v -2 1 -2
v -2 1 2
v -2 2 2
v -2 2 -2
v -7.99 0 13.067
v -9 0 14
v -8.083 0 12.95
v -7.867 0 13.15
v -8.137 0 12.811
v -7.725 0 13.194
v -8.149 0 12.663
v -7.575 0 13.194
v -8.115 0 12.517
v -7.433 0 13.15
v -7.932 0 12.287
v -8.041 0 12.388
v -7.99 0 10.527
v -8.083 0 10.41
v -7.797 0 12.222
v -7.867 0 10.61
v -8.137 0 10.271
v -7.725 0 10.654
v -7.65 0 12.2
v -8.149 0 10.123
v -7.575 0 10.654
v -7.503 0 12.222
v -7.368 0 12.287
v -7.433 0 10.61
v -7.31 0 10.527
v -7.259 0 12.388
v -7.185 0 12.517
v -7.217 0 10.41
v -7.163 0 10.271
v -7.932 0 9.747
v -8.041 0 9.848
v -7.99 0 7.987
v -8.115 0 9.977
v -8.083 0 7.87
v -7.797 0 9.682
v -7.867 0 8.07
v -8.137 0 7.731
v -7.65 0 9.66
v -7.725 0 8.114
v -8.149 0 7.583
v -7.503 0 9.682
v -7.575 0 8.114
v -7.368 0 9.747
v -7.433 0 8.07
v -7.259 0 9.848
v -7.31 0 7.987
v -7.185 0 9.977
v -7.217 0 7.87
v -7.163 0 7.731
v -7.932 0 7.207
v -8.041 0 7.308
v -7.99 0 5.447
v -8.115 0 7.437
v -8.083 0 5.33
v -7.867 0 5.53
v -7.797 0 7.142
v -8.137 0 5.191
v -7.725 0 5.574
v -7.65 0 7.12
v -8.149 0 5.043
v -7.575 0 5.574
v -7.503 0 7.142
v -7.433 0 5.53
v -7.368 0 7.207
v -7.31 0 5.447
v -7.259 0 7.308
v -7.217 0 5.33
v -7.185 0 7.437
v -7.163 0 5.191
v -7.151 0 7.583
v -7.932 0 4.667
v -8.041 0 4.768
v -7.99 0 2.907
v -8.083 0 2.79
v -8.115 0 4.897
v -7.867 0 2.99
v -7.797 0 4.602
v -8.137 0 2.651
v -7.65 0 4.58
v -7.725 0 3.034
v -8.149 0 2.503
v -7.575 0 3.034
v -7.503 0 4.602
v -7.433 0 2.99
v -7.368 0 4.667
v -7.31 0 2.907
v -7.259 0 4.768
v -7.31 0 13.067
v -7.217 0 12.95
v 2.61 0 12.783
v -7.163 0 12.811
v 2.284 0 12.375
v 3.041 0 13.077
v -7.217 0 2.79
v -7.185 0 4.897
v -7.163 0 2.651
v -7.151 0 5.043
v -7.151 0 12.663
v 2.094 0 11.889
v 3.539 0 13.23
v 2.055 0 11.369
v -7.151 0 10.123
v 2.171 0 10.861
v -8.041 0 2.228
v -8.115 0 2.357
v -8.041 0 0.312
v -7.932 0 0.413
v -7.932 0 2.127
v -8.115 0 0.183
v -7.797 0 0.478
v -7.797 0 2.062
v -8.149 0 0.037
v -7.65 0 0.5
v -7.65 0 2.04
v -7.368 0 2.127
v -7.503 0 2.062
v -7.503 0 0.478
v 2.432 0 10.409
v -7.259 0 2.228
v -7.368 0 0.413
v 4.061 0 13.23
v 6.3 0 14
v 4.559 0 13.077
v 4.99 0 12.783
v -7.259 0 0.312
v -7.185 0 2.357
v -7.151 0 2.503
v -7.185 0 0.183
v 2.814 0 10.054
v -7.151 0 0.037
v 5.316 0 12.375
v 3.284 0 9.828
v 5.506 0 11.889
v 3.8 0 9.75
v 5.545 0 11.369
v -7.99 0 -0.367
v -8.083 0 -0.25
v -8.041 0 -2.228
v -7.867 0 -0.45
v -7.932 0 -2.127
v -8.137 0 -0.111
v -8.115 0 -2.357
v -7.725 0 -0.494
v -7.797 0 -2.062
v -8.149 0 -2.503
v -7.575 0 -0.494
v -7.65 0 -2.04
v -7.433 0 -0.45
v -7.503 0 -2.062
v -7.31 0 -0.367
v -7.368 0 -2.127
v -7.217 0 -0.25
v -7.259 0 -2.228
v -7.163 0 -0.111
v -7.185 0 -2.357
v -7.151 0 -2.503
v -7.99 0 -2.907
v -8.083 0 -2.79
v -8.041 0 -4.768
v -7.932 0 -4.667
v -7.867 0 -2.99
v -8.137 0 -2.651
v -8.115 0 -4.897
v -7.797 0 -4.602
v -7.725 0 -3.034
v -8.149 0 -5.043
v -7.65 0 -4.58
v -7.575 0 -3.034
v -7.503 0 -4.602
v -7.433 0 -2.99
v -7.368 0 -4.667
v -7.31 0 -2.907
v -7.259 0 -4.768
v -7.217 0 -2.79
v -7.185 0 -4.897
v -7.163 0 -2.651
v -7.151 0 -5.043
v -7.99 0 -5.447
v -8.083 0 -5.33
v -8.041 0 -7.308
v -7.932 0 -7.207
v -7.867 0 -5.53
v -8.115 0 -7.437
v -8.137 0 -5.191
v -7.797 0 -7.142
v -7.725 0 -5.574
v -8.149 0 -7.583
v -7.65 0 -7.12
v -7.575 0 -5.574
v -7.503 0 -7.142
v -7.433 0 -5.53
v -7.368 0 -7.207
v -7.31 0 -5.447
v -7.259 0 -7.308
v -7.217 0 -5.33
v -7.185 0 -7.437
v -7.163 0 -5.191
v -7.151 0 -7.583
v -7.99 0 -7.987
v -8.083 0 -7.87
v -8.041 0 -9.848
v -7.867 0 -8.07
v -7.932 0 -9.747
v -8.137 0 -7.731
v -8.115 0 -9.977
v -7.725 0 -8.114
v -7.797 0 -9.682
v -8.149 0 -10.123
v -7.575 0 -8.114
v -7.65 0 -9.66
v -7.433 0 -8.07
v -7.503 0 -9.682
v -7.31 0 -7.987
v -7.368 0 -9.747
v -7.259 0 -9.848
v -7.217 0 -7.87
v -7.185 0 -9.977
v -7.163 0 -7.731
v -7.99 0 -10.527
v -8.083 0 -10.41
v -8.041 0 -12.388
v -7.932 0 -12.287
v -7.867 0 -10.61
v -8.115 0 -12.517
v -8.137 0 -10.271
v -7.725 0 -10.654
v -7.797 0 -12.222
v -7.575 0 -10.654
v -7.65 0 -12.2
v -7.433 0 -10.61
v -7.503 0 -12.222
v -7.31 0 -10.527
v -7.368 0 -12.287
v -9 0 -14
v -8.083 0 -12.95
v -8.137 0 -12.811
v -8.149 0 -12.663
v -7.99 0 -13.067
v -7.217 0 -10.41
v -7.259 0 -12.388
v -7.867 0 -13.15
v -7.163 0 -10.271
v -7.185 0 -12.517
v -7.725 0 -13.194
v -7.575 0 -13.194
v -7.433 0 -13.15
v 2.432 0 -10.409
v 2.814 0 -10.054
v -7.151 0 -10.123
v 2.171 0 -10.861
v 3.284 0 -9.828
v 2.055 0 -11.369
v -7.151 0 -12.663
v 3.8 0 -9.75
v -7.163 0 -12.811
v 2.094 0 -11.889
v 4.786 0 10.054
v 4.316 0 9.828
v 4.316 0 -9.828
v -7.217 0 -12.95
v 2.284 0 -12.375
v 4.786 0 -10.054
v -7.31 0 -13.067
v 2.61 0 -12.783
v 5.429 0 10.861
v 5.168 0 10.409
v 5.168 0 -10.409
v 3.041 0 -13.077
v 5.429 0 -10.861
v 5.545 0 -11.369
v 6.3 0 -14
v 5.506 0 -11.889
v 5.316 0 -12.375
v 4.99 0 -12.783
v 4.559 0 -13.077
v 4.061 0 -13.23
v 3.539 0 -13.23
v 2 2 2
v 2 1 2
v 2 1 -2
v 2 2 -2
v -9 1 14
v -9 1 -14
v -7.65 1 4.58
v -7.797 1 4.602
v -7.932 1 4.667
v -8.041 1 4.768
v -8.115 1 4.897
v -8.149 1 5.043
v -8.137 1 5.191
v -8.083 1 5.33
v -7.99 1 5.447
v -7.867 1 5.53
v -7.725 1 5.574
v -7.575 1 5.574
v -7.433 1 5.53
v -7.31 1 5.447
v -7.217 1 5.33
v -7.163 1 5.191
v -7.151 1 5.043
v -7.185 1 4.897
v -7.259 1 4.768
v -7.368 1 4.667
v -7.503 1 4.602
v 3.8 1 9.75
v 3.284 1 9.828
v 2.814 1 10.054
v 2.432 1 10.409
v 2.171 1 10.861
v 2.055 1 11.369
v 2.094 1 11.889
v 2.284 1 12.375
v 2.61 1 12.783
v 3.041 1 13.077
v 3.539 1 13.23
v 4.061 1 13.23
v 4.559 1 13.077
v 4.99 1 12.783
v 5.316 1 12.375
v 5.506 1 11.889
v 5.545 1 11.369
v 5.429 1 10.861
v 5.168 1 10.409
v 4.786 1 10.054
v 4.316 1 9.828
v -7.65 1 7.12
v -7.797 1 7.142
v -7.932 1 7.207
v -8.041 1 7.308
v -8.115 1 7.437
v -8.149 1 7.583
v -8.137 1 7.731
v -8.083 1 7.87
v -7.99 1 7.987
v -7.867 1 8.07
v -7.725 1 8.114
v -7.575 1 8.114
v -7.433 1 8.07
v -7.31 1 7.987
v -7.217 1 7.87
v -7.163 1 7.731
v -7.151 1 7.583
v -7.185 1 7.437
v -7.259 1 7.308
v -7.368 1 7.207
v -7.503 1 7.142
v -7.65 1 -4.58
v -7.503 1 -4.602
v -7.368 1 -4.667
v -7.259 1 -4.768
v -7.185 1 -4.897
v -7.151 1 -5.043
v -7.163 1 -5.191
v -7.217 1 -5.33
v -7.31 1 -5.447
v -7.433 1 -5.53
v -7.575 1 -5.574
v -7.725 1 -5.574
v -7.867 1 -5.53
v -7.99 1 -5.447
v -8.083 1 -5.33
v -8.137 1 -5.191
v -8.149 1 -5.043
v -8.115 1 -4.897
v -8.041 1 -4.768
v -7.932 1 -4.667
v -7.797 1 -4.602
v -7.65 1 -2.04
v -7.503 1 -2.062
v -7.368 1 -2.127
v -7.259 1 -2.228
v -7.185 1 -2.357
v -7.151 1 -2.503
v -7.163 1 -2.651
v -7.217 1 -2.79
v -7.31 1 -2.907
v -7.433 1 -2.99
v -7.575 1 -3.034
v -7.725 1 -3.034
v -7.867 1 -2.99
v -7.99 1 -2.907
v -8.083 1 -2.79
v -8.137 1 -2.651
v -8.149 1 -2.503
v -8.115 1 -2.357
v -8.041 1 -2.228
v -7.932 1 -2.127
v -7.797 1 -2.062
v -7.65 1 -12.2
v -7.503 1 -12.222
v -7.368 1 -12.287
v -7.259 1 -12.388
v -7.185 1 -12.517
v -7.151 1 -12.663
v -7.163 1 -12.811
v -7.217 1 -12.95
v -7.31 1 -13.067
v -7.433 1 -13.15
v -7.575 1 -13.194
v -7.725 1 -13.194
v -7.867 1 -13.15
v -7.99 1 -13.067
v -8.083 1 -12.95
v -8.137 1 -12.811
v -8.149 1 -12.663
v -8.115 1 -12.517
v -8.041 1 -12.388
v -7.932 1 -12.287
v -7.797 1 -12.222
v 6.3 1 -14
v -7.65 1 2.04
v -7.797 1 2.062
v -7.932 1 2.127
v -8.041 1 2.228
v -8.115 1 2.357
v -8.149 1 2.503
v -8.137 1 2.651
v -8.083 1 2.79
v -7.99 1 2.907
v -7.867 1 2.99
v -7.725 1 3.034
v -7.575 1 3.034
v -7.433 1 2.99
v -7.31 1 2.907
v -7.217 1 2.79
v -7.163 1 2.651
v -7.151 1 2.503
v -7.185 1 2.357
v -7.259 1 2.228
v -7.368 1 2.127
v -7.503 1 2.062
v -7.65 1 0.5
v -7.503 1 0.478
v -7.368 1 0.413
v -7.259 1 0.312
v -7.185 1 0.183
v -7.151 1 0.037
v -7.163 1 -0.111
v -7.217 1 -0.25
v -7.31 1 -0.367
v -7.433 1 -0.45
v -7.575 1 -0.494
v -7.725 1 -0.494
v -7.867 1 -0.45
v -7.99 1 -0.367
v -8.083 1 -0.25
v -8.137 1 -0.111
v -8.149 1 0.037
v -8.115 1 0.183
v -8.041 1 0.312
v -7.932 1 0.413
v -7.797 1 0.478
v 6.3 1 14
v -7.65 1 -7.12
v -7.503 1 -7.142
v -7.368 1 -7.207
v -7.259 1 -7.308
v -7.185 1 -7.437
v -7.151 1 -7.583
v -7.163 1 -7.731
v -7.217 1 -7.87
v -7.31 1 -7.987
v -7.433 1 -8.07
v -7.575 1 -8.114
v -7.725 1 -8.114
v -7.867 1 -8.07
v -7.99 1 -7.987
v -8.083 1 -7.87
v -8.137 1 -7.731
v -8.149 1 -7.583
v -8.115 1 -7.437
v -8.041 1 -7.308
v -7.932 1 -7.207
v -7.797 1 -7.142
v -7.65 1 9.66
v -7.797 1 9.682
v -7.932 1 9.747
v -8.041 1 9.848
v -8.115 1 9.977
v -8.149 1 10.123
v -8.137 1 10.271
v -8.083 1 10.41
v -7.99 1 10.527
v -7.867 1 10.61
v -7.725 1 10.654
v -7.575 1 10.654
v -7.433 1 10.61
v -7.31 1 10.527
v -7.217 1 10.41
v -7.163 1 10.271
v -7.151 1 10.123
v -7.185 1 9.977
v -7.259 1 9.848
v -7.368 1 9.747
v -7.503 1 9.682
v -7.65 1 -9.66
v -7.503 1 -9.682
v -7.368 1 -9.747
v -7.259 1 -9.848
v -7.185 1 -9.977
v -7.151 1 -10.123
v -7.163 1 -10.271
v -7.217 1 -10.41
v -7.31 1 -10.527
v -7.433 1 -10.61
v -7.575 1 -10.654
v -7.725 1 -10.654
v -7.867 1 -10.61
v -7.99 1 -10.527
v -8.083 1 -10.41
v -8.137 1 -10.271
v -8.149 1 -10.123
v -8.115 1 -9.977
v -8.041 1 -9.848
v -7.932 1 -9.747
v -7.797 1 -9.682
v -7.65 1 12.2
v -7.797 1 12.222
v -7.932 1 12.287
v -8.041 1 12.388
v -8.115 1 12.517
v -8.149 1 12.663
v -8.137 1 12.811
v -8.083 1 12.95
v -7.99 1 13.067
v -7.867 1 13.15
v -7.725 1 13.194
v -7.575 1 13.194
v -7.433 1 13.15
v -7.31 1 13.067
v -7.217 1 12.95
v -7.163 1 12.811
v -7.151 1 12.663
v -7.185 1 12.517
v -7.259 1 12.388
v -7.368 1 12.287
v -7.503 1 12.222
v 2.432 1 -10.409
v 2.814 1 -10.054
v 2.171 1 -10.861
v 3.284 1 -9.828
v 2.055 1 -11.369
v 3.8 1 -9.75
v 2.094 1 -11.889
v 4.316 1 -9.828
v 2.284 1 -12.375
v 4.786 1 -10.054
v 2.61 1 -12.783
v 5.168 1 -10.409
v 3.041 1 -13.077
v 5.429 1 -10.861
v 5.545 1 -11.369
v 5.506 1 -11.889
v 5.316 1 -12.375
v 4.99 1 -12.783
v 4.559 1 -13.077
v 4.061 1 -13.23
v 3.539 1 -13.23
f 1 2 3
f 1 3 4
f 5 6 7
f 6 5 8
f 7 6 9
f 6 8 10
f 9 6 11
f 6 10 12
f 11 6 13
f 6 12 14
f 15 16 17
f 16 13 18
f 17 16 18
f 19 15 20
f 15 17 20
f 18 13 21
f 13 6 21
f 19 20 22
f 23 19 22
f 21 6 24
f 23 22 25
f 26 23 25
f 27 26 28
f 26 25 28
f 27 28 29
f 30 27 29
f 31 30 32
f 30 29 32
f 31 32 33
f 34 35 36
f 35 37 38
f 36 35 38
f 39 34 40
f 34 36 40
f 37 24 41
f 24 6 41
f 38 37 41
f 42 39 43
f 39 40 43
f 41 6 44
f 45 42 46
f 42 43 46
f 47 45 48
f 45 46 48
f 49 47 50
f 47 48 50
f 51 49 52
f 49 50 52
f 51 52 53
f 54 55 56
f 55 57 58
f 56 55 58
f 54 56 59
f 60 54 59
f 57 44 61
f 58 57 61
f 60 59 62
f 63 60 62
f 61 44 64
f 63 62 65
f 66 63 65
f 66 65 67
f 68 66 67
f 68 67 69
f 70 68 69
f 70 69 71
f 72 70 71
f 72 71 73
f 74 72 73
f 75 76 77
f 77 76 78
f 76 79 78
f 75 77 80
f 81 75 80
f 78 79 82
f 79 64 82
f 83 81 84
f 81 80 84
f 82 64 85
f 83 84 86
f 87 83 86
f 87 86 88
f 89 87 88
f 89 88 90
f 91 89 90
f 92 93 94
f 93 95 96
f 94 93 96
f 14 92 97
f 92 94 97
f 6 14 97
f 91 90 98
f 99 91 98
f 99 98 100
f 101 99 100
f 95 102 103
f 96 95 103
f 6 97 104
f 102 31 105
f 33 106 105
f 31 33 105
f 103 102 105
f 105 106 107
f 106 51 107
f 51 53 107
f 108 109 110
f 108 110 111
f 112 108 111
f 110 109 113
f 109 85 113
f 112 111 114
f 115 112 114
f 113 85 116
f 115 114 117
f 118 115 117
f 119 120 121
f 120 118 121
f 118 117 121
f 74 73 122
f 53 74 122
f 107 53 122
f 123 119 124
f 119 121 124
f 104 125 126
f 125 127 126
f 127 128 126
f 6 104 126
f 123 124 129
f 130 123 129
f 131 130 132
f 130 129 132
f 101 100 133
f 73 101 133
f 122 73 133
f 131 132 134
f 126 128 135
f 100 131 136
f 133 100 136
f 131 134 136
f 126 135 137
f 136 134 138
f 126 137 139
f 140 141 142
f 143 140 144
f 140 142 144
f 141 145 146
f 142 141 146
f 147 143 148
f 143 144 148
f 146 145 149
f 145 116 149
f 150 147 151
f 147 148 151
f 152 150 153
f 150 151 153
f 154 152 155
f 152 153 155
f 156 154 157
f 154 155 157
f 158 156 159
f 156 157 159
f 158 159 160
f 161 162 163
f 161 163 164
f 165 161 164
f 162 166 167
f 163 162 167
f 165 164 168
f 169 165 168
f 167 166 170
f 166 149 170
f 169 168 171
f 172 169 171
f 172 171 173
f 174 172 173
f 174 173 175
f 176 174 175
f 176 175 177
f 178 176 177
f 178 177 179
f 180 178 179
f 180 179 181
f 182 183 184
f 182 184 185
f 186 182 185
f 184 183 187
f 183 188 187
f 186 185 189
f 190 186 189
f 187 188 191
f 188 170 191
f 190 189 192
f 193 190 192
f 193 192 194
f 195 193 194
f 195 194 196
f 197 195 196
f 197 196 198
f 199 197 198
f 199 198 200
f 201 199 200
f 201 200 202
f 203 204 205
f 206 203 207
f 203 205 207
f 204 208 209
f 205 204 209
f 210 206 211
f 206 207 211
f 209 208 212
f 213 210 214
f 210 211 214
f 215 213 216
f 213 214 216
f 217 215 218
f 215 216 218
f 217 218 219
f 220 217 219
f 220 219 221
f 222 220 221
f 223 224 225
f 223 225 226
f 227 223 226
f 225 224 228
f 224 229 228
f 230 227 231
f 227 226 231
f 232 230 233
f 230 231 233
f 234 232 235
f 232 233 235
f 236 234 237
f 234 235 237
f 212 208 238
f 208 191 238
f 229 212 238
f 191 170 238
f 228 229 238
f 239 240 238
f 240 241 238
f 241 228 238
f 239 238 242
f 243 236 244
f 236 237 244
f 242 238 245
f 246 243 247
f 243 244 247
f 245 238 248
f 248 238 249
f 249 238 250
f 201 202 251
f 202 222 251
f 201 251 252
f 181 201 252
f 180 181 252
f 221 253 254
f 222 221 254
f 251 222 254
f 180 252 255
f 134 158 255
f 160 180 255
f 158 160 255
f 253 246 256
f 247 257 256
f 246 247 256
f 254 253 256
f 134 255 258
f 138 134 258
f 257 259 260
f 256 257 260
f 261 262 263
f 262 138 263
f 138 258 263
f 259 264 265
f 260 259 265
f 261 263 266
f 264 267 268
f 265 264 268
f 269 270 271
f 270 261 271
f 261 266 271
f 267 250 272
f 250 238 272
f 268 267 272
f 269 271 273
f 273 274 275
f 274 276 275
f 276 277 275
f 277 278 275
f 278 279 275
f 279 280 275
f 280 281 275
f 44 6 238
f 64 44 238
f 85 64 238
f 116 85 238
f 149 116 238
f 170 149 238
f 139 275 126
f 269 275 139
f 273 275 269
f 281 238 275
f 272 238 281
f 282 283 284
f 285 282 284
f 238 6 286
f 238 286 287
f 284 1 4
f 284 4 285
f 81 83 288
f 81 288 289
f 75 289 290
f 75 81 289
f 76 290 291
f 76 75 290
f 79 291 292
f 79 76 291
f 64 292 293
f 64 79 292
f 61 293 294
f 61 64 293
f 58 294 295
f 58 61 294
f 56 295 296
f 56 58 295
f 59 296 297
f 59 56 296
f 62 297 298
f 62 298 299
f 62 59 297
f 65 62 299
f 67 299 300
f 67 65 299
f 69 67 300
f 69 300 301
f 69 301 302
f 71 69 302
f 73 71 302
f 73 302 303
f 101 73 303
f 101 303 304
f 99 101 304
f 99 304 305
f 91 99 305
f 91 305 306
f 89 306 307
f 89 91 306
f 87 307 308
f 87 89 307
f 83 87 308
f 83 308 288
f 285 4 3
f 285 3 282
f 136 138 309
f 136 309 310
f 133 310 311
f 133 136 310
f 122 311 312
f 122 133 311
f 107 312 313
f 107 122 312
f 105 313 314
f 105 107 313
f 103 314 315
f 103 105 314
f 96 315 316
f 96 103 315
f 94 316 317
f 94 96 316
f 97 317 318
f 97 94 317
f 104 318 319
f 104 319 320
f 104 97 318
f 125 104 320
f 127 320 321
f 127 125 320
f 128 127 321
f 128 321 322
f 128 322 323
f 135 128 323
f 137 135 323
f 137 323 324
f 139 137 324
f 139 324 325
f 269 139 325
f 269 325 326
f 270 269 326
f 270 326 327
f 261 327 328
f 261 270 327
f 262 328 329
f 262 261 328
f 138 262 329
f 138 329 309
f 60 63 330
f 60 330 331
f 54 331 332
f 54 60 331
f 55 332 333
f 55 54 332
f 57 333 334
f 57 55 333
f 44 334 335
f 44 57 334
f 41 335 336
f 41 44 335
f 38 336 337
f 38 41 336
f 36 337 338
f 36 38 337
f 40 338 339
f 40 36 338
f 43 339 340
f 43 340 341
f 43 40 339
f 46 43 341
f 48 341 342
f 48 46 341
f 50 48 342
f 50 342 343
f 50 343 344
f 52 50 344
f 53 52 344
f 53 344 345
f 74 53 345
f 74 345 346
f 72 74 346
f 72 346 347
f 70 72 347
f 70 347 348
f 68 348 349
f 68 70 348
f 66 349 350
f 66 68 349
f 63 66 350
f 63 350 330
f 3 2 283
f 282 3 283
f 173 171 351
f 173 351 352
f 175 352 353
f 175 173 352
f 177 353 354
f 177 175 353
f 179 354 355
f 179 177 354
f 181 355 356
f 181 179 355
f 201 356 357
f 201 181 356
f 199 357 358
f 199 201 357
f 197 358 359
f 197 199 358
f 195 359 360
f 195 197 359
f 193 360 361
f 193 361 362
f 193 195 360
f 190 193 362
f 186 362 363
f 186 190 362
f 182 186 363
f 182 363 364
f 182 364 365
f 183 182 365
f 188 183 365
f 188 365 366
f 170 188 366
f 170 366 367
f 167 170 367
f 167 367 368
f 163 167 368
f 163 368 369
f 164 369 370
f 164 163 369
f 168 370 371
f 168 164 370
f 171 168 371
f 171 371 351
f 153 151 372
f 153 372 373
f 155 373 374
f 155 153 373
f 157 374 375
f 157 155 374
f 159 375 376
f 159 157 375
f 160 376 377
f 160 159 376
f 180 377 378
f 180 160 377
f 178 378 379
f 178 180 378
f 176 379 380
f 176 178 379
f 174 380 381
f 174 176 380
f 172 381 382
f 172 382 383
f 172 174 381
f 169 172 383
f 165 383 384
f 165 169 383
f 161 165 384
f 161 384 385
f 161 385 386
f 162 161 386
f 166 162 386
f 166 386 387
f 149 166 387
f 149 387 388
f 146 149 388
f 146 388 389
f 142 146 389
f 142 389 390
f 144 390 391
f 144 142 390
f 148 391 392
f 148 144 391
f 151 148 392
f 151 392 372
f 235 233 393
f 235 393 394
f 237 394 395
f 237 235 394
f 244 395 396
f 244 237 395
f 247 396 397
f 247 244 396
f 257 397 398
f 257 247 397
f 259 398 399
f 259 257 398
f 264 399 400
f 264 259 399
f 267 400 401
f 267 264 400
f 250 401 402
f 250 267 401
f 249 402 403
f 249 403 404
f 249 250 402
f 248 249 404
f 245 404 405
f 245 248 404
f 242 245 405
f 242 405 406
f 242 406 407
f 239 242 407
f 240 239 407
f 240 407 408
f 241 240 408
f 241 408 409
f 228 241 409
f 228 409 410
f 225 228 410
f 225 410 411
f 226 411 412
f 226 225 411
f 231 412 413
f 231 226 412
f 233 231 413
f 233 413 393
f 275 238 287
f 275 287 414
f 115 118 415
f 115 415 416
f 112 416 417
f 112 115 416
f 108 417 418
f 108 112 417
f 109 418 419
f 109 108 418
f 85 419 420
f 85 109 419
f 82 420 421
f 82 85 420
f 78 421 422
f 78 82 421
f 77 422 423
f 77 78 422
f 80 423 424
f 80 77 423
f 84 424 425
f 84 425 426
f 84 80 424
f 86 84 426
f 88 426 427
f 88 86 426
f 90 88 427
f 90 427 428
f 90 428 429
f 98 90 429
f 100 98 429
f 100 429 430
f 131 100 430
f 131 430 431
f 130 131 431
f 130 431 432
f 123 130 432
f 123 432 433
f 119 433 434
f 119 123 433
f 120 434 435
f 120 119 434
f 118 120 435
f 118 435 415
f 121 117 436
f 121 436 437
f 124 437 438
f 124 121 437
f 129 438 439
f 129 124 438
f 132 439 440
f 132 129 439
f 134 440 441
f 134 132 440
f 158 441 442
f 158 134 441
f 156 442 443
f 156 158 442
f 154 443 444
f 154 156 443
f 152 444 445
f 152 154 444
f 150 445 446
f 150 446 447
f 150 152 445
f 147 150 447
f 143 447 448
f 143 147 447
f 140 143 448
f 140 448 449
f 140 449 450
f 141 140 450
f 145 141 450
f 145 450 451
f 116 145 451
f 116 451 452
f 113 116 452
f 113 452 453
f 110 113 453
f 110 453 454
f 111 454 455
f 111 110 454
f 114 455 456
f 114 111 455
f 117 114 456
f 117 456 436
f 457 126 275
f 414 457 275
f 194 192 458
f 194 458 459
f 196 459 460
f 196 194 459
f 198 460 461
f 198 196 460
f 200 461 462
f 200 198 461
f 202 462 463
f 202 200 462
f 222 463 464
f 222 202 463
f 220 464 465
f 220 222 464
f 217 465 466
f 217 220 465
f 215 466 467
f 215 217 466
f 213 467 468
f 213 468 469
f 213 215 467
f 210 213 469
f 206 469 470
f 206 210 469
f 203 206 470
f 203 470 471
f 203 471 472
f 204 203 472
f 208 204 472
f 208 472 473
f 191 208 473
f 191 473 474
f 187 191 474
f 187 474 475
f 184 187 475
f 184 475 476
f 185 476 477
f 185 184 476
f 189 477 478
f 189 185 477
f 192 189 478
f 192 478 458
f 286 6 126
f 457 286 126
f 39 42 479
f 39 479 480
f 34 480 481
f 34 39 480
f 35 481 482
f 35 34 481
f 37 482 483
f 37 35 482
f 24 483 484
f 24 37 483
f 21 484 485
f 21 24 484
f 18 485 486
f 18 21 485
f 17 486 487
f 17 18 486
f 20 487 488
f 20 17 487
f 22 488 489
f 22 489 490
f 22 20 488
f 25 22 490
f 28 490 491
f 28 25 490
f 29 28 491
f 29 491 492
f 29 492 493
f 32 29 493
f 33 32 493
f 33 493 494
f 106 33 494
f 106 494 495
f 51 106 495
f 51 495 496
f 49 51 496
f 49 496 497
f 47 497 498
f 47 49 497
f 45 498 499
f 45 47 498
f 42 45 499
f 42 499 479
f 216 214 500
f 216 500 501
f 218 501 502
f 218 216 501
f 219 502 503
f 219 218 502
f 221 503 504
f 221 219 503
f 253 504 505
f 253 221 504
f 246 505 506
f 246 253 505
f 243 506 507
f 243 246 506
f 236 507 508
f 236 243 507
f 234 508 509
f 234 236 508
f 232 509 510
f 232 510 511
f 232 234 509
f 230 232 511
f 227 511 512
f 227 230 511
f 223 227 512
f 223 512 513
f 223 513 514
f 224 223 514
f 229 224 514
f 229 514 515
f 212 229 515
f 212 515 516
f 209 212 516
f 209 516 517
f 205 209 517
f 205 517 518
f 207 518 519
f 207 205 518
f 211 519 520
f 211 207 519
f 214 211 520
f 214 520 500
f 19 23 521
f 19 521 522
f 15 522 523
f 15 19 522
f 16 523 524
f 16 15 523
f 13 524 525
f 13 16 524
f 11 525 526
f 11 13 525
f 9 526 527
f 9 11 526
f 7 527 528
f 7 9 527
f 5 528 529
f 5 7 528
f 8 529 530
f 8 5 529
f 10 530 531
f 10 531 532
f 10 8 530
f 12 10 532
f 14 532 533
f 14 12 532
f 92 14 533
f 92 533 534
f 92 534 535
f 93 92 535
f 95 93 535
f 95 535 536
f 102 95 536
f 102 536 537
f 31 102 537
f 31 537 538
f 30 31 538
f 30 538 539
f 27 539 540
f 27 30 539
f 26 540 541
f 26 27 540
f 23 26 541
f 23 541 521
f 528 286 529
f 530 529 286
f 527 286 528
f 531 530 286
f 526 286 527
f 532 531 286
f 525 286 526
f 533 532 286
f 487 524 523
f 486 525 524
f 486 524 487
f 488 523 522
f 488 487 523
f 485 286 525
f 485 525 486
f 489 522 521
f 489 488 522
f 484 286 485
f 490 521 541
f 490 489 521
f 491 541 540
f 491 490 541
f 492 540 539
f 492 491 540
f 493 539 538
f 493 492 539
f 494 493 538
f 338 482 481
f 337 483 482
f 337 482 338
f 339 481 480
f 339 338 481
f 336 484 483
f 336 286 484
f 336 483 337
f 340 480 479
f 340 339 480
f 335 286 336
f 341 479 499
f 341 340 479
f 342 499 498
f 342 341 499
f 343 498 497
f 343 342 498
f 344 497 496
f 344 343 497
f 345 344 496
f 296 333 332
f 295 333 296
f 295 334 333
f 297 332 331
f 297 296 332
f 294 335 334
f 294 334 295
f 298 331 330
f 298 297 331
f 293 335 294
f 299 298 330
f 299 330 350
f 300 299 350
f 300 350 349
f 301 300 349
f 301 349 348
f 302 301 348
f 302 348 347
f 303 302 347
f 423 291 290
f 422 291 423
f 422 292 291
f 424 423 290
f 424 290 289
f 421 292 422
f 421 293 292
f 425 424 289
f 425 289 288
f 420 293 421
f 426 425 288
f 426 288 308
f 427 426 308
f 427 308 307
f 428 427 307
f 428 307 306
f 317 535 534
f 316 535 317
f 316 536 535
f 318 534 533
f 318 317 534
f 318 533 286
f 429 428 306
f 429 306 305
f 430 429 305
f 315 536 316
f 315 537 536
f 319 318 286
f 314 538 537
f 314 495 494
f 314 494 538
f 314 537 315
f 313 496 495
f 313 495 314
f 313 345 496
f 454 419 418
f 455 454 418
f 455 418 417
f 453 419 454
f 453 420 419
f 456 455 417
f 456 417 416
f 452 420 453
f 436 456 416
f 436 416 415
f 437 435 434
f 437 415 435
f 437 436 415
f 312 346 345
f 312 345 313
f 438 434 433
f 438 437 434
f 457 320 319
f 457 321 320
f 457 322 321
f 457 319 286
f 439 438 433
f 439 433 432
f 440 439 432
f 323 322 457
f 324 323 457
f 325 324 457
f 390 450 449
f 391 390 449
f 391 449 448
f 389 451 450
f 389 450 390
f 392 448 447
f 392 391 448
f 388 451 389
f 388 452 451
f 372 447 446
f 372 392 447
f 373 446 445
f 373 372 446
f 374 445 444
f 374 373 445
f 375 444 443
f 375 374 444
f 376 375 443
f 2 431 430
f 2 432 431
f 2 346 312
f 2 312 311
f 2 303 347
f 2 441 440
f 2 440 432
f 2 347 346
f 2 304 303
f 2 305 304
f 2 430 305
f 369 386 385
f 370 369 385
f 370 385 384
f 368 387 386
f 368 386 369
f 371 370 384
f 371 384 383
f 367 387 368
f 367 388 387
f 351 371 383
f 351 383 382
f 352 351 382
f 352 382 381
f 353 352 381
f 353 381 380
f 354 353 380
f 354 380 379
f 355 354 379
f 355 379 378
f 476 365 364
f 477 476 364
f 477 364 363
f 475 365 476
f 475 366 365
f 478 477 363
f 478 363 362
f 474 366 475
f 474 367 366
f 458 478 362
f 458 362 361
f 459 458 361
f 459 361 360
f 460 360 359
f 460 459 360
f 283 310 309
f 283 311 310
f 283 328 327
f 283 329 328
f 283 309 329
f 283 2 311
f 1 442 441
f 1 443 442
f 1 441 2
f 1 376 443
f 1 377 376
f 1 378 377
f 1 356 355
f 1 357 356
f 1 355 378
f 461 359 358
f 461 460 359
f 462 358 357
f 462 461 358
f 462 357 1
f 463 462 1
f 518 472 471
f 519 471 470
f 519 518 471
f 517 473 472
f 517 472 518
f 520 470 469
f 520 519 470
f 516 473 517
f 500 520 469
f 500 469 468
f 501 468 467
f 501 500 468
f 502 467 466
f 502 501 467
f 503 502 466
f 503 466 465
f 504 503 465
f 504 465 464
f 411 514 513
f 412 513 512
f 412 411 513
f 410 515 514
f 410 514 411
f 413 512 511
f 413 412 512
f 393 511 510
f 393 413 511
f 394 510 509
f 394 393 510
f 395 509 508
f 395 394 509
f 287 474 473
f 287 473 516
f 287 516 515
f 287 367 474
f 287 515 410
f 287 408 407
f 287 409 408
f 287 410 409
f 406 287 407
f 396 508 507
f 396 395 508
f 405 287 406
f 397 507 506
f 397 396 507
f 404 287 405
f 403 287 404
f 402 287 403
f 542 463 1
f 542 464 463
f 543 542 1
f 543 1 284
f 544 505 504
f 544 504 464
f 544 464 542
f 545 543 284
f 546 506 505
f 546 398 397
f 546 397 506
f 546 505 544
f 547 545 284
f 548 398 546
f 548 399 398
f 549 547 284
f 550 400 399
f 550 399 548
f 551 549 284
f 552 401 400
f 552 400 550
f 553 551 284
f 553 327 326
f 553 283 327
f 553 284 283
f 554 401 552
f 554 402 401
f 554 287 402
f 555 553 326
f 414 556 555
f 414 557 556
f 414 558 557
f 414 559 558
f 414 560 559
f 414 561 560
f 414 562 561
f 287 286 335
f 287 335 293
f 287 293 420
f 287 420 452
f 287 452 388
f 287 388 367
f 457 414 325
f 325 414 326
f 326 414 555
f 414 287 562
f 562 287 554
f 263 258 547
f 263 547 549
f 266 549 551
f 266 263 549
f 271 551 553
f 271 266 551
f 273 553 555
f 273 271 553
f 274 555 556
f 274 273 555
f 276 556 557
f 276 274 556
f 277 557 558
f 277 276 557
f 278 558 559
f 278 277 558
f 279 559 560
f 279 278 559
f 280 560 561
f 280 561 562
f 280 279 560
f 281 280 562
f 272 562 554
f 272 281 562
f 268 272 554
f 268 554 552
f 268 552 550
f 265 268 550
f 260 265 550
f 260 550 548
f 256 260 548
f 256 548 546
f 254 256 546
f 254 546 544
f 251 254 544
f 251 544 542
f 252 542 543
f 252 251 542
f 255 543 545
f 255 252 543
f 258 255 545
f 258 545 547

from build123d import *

# Parameters (mm, degrees)
SKETCH1_W           = 15.3
SKETCH1_H           = 28
SKETCH1_R           = 1.75
SKETCH1_R_2         = 0.5
BOSS_EXTRUDE1_DEPTH = 1
SKETCH2_W           = 4
SKETCH2_H           = 4
BOSS_EXTRUDE2_DEPTH = 1


with BuildPart() as part:
    # Sketch1 → Boss-Extrude1 (new body)
    with BuildSketch(Plane(origin=(0, 0, 0), x_dir=(1, 0, 0), z_dir=(0, 1, 0))):
        with Locations((-1.35, 0)):
            Rectangle(SKETCH1_W, SKETCH1_H)
        with Locations(Location((3.8, 11.5, 0), (0, 0, 270))):
            Circle(SKETCH1_R, mode=Mode.SUBTRACT)
        with Locations(Location((3.8, -11.5, 0), (0, 0, 90))):
            Circle(SKETCH1_R, mode=Mode.SUBTRACT)
        with Locations(Location((-7.65, 0, 0), (0, 0, 270))):
            Circle(SKETCH1_R_2, mode=Mode.SUBTRACT)
        with Locations(Location((-7.65, 2.54, 0), (0, 0, 270))):
            Circle(SKETCH1_R_2, mode=Mode.SUBTRACT)
        with Locations(Location((-7.65, 5.08, 0), (0, 0, 270))):
            Circle(SKETCH1_R_2, mode=Mode.SUBTRACT)
        with Locations(Location((-7.65, 7.62, 0), (0, 0, 270))):
            Circle(SKETCH1_R_2, mode=Mode.SUBTRACT)
        with Locations(Location((-7.65, 10.16, 0), (0, 0, 270))):
            Circle(SKETCH1_R_2, mode=Mode.SUBTRACT)
        with Locations(Location((-7.65, 12.7, 0), (0, 0, 270))):
            Circle(SKETCH1_R_2, mode=Mode.SUBTRACT)
        with Locations(Location((-7.65, -12.7, 0), (0, 0, 90))):
            Circle(SKETCH1_R_2, mode=Mode.SUBTRACT)
        with Locations(Location((-7.65, -10.16, 0), (0, 0, 90))):
            Circle(SKETCH1_R_2, mode=Mode.SUBTRACT)
        with Locations(Location((-7.65, -7.62, 0), (0, 0, 90))):
            Circle(SKETCH1_R_2, mode=Mode.SUBTRACT)
        with Locations(Location((-7.65, -5.08, 0), (0, 0, 90))):
            Circle(SKETCH1_R_2, mode=Mode.SUBTRACT)
        with Locations(Location((-7.65, -2.54, 0), (0, 0, 90))):
            Circle(SKETCH1_R_2, mode=Mode.SUBTRACT)
    extrude(amount=BOSS_EXTRUDE1_DEPTH)

    # Sketch2 → Boss-Extrude2 (add)
    with BuildSketch(Plane(origin=(0, 1, 0), x_dir=(1, 0, 0), z_dir=(0, 1, 0))):
        Rectangle(SKETCH2_W, SKETCH2_H)
    extrude(amount=BOSS_EXTRUDE2_DEPTH)


solid = part.part
